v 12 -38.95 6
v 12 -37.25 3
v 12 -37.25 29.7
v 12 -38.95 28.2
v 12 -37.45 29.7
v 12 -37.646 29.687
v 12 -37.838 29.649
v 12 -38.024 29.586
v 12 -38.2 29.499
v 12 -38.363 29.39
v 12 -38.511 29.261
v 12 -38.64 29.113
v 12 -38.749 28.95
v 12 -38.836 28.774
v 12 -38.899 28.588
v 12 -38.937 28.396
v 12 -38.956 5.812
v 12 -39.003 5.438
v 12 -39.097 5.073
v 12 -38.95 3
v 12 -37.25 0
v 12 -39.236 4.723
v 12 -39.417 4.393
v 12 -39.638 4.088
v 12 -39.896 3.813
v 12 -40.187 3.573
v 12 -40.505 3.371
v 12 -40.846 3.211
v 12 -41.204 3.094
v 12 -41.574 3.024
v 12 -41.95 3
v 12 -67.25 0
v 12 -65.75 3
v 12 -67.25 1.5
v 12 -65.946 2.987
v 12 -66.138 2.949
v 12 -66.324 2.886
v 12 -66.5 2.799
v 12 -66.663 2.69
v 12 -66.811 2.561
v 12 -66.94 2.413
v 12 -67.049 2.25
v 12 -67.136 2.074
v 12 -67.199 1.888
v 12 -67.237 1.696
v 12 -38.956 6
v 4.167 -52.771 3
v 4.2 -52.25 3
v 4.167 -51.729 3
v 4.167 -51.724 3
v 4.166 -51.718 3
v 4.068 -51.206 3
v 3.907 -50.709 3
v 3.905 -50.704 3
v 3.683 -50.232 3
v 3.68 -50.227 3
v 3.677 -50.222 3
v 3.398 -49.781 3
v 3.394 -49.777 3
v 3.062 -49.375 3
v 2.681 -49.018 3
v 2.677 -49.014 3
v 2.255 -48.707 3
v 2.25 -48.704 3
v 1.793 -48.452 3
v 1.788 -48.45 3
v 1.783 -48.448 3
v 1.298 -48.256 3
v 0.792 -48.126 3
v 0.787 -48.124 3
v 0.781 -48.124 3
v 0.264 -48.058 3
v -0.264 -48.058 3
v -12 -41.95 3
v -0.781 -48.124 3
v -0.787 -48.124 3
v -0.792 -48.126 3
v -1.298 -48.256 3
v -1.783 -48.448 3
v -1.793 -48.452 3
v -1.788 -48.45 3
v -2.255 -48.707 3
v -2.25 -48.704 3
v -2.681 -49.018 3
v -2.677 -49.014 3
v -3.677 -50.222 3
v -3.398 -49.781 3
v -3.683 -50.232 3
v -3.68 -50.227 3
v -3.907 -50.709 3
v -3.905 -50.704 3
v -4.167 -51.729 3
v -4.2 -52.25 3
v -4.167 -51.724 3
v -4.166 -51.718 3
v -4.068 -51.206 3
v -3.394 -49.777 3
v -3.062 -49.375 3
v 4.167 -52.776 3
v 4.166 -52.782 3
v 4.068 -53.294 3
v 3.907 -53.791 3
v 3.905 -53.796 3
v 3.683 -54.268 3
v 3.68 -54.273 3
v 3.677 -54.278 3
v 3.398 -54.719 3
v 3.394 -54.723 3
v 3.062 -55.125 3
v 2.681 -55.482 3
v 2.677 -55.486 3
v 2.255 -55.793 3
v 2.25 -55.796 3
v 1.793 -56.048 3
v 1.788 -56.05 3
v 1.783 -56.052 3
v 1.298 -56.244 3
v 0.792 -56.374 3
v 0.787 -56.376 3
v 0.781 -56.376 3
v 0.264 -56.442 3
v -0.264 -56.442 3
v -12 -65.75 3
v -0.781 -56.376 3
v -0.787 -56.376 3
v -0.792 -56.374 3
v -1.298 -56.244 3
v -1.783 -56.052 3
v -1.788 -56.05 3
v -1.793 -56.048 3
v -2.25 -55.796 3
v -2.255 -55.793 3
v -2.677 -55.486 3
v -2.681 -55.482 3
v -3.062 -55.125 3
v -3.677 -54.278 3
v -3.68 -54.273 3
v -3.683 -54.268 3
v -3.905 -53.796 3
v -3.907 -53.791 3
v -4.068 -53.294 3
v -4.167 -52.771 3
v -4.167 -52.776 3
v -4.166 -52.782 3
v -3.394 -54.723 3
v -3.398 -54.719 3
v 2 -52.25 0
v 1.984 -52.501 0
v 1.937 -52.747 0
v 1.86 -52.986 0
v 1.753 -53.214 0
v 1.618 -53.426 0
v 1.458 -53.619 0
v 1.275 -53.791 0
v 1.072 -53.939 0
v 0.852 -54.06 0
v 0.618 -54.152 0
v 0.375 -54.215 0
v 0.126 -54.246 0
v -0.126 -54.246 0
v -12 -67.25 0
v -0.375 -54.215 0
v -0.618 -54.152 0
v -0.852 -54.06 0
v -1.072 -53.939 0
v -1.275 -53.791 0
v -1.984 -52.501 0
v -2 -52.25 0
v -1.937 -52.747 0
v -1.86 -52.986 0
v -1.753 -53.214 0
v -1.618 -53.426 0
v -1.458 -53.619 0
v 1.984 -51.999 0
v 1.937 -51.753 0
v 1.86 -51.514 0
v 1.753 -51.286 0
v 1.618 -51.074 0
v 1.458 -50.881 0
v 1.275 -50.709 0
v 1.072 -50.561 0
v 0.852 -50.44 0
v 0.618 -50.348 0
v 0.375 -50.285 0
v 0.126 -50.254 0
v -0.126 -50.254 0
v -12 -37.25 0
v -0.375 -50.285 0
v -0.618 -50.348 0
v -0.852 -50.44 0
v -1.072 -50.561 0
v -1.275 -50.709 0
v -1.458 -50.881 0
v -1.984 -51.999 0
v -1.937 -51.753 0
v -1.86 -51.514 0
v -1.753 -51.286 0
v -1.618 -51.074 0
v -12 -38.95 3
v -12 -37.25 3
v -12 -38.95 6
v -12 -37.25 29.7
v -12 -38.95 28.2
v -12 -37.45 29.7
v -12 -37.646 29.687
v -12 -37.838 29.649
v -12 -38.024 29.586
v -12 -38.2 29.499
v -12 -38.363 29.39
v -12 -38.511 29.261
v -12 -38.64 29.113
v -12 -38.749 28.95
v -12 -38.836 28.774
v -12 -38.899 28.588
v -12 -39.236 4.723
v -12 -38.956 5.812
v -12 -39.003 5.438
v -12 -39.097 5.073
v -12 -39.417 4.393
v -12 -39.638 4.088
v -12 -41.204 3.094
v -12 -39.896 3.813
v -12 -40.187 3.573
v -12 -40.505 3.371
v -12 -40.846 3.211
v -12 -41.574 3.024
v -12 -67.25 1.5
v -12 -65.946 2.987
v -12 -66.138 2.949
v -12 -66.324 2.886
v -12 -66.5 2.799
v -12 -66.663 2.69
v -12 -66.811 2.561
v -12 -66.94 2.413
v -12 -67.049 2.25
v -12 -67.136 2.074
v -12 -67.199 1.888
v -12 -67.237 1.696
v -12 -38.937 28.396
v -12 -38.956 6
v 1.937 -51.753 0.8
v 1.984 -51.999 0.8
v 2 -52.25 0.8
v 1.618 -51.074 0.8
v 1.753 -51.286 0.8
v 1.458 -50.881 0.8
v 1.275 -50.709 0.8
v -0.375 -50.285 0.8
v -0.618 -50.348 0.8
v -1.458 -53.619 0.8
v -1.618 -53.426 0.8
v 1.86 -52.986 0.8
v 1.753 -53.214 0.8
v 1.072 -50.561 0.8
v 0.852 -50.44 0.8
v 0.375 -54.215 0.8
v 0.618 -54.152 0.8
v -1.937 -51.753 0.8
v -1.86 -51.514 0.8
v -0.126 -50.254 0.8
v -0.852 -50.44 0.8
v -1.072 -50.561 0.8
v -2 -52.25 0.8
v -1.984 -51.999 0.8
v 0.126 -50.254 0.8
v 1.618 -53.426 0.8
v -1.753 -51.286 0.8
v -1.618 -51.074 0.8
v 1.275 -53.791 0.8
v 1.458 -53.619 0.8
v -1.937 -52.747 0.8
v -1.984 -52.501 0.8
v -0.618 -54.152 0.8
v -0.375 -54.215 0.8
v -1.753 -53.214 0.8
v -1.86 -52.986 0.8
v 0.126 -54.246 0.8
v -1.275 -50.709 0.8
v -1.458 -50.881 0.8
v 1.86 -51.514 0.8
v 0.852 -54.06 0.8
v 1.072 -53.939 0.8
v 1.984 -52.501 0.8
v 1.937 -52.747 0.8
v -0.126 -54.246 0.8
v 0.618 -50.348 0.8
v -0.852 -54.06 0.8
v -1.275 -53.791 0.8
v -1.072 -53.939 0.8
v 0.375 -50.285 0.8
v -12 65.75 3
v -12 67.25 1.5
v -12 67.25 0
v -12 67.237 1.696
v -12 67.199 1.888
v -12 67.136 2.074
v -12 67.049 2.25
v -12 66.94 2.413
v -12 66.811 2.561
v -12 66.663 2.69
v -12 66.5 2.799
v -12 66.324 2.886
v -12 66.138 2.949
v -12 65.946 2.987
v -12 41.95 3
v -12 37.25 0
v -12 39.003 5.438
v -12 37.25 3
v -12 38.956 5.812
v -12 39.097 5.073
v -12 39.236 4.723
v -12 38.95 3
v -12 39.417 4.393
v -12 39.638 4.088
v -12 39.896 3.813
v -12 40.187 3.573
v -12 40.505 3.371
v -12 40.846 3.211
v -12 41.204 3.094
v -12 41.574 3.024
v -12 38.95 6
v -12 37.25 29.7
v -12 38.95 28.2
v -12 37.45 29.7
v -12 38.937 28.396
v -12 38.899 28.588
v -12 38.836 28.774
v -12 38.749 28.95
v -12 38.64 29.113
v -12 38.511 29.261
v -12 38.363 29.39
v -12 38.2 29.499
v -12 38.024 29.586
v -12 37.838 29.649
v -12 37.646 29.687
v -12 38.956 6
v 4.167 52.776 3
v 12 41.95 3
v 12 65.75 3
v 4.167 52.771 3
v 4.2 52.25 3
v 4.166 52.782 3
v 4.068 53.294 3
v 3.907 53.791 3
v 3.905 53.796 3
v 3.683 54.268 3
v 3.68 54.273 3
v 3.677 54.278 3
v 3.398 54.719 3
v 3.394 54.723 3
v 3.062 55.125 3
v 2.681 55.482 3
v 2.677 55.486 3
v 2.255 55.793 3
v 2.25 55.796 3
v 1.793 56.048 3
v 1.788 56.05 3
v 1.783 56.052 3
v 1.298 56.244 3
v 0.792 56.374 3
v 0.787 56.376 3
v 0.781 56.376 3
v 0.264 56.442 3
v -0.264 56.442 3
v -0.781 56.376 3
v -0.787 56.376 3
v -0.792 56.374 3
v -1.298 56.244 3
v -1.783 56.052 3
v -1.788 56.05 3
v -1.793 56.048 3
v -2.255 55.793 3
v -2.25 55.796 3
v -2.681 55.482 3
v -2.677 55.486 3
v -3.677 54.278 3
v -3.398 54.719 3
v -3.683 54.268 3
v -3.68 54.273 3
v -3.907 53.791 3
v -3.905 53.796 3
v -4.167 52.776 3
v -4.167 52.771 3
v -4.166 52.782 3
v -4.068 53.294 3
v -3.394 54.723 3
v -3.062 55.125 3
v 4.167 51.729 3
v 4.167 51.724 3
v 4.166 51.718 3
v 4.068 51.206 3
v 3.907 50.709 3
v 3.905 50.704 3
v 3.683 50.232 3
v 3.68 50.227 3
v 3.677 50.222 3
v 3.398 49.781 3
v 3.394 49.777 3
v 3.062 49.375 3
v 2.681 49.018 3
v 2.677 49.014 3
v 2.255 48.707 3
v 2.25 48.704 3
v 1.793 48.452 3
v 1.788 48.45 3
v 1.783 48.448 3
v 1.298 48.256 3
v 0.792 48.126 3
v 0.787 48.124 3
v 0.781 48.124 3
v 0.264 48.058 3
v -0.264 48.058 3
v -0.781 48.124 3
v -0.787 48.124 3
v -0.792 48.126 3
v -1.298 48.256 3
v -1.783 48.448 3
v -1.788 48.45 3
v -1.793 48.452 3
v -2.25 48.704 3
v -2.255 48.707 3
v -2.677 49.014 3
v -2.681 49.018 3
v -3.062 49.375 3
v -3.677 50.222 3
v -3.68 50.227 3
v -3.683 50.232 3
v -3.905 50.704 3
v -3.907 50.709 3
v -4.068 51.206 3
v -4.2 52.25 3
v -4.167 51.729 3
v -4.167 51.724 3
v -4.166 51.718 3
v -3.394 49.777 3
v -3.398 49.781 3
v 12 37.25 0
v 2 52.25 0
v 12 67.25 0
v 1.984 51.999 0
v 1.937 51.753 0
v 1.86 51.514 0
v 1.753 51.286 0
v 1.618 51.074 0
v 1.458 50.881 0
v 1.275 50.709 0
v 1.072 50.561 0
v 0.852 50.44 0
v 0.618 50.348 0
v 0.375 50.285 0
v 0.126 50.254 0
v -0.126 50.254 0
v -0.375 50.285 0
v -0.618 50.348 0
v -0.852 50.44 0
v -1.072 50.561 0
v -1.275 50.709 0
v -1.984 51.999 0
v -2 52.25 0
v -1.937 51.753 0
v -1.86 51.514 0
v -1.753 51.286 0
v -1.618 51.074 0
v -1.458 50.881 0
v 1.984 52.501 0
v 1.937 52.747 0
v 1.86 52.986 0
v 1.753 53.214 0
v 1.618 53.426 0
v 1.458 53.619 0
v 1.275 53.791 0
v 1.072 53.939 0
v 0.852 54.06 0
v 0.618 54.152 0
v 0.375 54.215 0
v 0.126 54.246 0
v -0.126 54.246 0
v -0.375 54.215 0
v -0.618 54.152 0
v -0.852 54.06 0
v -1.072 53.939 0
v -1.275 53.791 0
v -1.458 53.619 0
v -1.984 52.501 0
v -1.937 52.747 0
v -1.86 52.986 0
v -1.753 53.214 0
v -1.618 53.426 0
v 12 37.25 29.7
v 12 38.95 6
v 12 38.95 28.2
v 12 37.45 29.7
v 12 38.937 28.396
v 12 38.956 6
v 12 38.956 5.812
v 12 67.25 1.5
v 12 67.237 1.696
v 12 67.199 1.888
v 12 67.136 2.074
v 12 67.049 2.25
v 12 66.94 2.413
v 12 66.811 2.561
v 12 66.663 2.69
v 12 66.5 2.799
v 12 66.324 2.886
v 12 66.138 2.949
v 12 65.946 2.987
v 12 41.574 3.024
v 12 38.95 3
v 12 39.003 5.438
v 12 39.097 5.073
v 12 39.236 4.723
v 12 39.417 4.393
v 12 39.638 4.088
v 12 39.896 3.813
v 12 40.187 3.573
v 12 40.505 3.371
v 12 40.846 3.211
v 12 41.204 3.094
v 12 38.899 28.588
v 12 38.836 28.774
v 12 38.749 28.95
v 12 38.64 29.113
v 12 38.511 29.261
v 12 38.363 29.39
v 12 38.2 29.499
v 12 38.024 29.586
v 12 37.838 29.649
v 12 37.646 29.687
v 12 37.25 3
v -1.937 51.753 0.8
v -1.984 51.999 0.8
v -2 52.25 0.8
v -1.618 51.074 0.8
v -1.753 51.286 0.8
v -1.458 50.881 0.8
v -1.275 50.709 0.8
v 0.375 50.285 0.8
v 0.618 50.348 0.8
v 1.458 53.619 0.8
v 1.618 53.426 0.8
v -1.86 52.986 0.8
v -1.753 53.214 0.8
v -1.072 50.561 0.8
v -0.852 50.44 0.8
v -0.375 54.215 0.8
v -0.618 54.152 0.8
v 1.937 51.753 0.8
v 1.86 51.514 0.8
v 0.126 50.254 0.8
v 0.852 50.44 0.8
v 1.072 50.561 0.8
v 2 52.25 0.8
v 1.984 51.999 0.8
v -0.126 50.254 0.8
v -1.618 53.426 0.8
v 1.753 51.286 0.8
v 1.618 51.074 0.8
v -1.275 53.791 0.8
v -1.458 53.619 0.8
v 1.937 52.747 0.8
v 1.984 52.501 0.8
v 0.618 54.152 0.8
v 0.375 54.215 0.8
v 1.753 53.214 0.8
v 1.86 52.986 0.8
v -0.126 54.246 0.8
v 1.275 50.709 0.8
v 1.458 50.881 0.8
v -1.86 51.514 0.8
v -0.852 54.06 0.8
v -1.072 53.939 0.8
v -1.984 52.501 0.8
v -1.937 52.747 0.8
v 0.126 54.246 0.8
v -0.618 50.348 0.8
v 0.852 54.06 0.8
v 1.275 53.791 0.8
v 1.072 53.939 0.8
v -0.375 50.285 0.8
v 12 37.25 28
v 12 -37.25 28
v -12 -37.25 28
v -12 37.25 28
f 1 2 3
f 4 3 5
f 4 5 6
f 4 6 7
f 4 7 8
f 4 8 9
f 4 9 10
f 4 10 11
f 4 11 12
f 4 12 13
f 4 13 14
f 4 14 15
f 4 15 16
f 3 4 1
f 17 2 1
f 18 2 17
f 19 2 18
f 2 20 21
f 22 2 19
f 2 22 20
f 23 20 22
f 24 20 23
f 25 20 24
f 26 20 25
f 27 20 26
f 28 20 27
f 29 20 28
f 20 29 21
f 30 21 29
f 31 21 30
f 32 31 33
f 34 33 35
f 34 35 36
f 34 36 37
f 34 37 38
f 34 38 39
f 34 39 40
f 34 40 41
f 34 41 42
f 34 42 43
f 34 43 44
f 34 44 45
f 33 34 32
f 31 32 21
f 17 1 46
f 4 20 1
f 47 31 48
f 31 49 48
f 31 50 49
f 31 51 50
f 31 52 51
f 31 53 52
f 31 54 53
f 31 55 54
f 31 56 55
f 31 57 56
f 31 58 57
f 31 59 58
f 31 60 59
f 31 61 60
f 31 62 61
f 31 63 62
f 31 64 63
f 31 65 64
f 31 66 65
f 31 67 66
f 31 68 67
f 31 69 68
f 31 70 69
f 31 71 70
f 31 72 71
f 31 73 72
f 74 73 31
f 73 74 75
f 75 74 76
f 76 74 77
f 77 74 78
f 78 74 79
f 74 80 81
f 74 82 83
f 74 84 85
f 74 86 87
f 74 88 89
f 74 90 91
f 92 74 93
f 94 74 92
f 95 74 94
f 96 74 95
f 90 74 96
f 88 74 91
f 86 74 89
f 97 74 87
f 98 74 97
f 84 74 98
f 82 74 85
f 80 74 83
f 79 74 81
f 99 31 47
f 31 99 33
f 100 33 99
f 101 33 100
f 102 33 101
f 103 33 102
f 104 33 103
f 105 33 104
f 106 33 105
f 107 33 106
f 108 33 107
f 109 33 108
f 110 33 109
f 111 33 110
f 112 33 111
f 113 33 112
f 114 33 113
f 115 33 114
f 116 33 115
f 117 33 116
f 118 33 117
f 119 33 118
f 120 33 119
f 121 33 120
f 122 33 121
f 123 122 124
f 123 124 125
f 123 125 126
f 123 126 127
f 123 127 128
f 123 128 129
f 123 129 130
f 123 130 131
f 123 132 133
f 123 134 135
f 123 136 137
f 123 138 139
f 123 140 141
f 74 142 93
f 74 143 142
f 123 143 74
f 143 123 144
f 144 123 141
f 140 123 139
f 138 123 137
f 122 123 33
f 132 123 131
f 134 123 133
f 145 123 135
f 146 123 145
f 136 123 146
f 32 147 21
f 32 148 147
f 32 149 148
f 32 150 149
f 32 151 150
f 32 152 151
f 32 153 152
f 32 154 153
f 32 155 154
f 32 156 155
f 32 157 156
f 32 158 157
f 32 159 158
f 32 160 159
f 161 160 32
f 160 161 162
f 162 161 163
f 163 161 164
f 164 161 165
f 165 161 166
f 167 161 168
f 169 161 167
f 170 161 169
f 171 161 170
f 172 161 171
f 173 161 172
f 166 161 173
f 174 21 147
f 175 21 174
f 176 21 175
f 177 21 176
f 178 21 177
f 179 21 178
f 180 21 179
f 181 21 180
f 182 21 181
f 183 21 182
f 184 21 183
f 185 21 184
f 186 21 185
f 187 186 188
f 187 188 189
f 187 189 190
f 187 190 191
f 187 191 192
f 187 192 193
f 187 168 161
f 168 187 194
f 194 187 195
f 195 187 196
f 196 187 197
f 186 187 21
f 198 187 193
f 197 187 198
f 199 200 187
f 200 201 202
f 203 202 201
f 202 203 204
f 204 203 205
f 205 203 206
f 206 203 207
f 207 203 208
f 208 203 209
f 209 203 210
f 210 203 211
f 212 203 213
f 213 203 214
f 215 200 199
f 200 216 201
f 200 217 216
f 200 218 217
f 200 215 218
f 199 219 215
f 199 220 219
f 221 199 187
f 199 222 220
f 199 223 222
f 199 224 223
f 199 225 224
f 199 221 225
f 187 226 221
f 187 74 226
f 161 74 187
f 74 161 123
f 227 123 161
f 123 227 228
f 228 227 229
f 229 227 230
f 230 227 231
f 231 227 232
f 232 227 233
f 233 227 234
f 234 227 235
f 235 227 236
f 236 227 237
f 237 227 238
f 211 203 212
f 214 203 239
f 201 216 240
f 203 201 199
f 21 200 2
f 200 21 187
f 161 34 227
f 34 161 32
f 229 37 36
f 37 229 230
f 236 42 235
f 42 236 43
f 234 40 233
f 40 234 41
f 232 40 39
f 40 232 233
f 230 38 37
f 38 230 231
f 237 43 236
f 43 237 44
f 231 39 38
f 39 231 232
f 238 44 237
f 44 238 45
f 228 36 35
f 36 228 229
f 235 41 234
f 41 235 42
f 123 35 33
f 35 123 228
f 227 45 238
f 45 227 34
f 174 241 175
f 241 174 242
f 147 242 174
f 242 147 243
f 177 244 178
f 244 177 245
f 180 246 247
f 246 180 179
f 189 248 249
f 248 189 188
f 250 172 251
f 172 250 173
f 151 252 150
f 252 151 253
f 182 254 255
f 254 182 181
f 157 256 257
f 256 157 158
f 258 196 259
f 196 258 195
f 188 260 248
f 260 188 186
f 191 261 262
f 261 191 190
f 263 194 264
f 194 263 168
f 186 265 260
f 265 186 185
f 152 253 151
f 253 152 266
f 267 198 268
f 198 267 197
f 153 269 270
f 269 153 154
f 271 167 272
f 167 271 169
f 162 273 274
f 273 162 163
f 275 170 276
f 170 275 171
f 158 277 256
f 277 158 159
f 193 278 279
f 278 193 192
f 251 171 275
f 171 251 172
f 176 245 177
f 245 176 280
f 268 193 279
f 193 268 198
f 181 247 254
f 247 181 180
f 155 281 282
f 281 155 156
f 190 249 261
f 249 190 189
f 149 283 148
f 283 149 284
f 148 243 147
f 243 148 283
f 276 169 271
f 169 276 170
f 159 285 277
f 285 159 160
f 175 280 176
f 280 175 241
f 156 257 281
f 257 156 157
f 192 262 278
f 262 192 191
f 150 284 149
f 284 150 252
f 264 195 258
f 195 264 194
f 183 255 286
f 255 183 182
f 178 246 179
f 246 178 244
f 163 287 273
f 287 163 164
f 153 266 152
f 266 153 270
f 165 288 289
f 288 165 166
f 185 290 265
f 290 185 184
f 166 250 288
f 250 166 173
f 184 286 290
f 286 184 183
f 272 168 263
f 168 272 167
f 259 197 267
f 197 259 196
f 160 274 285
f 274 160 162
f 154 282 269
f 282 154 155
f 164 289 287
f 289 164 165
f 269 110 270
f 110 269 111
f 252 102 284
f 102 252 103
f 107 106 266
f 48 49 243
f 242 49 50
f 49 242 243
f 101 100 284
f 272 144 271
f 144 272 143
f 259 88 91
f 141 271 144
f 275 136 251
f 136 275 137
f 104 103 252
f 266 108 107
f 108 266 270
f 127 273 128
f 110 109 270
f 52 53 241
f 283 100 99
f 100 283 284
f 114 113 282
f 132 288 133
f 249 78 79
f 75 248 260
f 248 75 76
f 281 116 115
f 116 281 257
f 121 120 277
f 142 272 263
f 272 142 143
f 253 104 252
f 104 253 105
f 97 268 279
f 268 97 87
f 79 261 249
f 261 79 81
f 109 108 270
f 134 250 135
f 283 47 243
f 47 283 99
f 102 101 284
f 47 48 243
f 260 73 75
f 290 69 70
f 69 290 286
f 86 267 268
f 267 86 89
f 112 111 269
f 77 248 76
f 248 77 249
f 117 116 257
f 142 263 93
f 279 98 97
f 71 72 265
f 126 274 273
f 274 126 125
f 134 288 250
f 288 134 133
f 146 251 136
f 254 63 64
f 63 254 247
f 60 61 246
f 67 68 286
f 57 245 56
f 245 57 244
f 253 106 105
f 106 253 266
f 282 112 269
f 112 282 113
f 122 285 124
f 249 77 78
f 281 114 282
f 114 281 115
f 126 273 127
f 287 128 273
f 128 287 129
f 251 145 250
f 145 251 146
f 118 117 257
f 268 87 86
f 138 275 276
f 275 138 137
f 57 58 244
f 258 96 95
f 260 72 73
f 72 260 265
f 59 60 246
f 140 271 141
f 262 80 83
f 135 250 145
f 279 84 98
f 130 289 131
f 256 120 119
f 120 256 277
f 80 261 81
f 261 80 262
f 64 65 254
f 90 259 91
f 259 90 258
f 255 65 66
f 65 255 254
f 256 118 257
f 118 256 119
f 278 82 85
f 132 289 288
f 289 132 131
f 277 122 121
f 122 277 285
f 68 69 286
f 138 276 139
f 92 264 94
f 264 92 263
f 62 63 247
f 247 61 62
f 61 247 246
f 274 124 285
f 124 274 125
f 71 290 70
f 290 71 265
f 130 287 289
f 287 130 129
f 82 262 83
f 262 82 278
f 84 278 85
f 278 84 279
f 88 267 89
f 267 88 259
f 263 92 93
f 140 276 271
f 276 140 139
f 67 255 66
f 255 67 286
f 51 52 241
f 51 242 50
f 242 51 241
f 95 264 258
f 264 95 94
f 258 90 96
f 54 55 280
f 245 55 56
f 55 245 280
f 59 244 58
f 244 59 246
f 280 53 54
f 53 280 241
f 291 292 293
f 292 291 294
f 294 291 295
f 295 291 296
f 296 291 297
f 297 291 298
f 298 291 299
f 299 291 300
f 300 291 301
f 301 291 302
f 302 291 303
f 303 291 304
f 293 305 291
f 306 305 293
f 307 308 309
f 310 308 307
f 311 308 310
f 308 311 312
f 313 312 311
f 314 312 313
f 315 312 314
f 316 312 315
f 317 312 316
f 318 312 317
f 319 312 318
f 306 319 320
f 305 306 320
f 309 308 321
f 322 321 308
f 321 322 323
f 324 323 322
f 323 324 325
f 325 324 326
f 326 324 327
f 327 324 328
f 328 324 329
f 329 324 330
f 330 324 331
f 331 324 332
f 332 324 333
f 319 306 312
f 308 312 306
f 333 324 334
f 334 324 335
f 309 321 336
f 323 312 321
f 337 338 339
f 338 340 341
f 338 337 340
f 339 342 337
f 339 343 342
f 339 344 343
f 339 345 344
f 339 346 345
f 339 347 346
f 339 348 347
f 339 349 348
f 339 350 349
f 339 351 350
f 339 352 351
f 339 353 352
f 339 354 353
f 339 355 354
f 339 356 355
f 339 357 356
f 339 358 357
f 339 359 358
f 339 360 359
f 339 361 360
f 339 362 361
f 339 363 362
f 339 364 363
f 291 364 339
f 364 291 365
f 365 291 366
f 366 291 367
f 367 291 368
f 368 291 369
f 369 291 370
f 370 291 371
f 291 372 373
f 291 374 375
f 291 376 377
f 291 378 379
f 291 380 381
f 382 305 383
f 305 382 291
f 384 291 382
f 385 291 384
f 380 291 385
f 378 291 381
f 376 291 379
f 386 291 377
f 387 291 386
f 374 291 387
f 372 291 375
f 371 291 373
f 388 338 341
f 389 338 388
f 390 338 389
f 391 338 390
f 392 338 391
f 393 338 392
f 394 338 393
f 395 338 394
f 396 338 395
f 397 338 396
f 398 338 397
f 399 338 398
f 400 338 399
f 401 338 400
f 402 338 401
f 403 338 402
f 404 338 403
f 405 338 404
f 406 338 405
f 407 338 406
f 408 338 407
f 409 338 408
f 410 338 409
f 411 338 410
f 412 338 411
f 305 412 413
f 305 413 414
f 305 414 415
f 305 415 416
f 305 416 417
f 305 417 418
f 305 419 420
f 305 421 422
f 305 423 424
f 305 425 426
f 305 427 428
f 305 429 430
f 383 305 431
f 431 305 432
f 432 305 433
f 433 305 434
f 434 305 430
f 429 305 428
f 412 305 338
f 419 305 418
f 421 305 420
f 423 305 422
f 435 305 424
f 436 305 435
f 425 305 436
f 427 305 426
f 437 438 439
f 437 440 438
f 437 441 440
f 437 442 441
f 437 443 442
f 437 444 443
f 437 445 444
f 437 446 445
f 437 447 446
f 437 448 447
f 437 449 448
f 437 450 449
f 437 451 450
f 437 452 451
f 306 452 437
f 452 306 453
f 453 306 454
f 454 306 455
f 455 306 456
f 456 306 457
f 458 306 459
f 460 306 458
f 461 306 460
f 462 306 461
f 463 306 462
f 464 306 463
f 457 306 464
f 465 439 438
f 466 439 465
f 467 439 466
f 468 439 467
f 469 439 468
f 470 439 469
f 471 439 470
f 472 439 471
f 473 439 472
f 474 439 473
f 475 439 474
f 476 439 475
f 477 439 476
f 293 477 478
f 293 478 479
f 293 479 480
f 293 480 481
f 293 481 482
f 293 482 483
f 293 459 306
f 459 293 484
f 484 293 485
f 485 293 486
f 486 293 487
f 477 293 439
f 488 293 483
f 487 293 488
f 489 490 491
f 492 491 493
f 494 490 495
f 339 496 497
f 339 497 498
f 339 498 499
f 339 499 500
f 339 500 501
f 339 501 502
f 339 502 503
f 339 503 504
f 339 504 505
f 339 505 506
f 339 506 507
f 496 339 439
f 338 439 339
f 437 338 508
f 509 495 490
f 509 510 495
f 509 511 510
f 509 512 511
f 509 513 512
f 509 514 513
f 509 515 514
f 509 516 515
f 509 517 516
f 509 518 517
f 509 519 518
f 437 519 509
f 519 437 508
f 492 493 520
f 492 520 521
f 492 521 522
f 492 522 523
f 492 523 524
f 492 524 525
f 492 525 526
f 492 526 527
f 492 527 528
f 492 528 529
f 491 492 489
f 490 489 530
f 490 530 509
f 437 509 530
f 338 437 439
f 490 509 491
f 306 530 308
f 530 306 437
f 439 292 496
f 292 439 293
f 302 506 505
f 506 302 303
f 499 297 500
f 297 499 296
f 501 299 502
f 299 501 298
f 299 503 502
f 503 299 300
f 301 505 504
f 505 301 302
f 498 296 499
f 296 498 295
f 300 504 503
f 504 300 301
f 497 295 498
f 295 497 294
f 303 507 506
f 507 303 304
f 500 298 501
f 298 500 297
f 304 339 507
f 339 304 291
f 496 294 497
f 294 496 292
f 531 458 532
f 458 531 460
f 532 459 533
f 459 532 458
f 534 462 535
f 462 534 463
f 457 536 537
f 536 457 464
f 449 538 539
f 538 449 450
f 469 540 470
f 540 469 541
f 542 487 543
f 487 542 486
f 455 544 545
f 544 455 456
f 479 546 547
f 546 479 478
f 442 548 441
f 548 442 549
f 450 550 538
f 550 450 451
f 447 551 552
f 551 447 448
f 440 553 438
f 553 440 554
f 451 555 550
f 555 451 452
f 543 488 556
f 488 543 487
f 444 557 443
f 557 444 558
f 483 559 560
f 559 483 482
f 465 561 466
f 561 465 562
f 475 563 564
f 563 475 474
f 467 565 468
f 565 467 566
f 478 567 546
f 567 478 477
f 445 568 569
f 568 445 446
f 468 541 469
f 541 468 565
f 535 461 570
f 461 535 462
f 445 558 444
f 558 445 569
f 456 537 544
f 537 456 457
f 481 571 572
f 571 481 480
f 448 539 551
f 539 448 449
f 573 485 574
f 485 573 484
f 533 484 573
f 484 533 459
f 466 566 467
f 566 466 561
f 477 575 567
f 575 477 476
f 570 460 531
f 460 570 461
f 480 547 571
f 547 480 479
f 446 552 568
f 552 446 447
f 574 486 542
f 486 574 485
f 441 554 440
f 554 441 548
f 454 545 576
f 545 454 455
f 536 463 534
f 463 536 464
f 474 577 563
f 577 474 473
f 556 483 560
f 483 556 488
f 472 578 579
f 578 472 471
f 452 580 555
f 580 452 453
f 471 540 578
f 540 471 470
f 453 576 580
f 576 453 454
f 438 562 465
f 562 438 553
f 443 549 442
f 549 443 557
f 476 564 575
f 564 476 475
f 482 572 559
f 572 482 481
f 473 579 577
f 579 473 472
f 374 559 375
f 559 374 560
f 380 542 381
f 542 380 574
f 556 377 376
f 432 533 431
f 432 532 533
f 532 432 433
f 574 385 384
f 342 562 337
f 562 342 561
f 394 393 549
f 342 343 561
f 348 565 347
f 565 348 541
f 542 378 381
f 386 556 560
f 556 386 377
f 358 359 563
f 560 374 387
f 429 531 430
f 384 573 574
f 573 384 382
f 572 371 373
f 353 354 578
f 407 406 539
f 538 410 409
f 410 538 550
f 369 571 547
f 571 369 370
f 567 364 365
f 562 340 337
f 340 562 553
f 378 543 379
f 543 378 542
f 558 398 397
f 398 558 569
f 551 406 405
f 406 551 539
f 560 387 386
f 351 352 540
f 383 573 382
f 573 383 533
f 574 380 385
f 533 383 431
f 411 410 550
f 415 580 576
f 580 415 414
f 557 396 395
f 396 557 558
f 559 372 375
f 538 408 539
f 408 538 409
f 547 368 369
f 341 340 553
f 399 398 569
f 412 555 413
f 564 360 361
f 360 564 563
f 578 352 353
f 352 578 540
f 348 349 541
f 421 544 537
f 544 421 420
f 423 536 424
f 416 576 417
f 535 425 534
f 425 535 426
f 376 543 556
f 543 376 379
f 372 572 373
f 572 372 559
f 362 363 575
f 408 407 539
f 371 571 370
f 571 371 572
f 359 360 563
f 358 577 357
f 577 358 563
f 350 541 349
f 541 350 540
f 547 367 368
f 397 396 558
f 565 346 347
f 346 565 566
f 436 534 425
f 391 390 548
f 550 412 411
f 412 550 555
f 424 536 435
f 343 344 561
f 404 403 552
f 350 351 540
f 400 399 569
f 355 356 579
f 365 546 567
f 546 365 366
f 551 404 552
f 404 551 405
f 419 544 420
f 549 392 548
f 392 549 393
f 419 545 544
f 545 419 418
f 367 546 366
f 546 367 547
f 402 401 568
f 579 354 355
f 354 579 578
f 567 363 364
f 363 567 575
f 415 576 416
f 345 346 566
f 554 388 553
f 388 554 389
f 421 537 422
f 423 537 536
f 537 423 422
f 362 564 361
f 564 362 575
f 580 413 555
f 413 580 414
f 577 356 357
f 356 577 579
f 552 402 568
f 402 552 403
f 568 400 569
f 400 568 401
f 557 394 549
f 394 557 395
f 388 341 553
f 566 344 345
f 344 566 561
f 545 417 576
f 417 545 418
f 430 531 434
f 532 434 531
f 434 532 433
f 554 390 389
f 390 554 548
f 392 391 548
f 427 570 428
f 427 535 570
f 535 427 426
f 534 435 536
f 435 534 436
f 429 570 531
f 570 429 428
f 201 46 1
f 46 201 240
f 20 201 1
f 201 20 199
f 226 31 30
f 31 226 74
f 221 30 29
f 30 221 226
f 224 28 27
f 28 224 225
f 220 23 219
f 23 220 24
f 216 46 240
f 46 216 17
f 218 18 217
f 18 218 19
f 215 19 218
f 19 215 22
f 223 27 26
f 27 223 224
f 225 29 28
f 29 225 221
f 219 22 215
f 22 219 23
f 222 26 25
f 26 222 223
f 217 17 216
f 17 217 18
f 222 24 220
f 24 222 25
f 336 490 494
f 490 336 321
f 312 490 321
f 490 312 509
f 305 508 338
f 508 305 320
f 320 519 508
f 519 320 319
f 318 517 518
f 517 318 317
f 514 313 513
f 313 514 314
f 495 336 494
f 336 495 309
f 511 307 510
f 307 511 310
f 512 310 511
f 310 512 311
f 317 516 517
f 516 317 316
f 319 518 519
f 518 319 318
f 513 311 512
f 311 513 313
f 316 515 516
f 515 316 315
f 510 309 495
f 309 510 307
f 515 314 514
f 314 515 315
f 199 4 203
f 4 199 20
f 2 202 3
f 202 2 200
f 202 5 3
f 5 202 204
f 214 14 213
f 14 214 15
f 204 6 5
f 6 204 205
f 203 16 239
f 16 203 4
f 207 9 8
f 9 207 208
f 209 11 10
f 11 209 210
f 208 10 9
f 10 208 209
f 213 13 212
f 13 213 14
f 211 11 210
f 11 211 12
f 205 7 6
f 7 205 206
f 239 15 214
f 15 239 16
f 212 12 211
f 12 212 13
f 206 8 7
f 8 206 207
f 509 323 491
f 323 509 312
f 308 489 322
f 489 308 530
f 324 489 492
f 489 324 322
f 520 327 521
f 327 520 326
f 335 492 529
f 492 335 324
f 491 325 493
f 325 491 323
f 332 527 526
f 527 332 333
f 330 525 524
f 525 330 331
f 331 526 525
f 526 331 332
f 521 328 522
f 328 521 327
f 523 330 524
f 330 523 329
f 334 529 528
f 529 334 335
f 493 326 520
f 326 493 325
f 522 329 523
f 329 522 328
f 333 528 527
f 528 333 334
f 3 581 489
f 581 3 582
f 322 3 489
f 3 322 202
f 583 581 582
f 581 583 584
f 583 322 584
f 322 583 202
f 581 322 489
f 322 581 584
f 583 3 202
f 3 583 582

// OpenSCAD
// file: ../../lib/rounded.scad
$fn=50;

module rounded_rectangle(width, height, radius) {
    minkowski() {
        square([width - radius*2, height - radius*2], center=true);
        circle(radius);
    }
}

module rounded_rectangle_border(width, height, radius, wall_width) {
    difference() {
      rounded_rectangle(width, height, radius);
      rounded_rectangle(width - wall_width*2, height - wall_width*2, radius);
    }
}

module rounded_cube(width, depth, height, radius) {
    minkowski() {
        cube([width - radius*2, depth - radius*2, height - radius*2], center=true);
        sphere(radius);
    }
}

module half_rounded_cube(width, depth, height, radius) {
    intersection() {
        rounded_cube(width, depth, height*2, radius);

        translate([-width/2, -depth/2, 0])
        cube([width, depth, height]);
    }
}

module quarter_rounded_cube(width, depth, height, radius) {
    intersection() {
        rounded_cube(width, depth*2, height*2, radius);

        translate([-width/2, 0, 0])
        cube([width, depth, height]);
    }
}

module negative_edge(width, radius) {
    difference() {
        cube([width, radius, radius], center = true);

        translate([0, radius/2, radius/2])
        rotate([0,90,0])
        cylinder(h = width + 0.1, r = radius, center = true);
    }
}


module rounded_edge(width, depth, height, radius) {
    assert(radius <= height, "Radius must be less or equal to the height");
    union() {
        translate([0, radius, 0])
        cube([width, depth - radius, height]);

        cube([width, radius, height - radius]);

        translate([0, radius, (height - radius)])
        quarter_cylinder(height = width, radius = radius);
    }
}

module centered_rounded_edge(width, depth, height, radius) {
    translate([-width/2, -depth/2, -height/2])
    rounded_edge(width, depth, height, radius);
}

module quarter_cylinder(height, radius) {
    rotate([90, -90, 90])
    rotate_extrude(angle = 90)
    square([radius, height]);
}

//cube([10,20,30]);
//rounded_cube(30, 50, 12, 5);
//half_rounded_cube(30, 50, 6, 5);
//quarter_rounded_cube(30, 25, 6, 5);
//centered_rounded_edge(100, 30, 12, 11);
//half_cylinder(30, 5);
//negative_edge(40, 5);
// file: ../../lib/chamfer.scad
module chamfered_hole(height, hole_diameter, chamfer_diameter) {
  chamfer_height = (chamfer_diameter - hole_diameter) / 2;
  cylinder_height = height - chamfer_height;

  translate([ 0, 0, -height / 2 ]) union() {
    // Add 0.1 to make sure the union with the chamfer is perfect
    cylinder(h = cylinder_height + 0.1, d = hole_diameter);

    translate([ 0, 0, cylinder_height ])
        cylinder(h = chamfer_height, d1 = hole_diameter, d2 = chamfer_diameter);
  }
}
// main file
$fn = 50;

use <../../lib/chamfer.scad>
use <../../lib/rounded.scad>

module grip(grip_depth, object_width, object_height, thingy_depth = 30,
            bottom_wall_width = 3, wall_width = 1.7) {
  large_fillet_radius = 3;

  union() {
    // Horizontal Left
    translate(
        [ 0, -thingy_depth / 2 - object_width / 2, bottom_wall_width / 2 ])
        grip_thingy(width = grip_depth, depth = thingy_depth,
                    height = bottom_wall_width);

    // Horizontal Right
    translate([ 0, thingy_depth / 2 + object_width / 2, bottom_wall_width / 2 ])
        rotate([ 0, 0, 180 ])
            grip_thingy(width = grip_depth, depth = thingy_depth,
                        height = bottom_wall_width);

    // Fillet Left
    translate([
      0, -large_fillet_radius / 2 - wall_width - object_width / 2,
      large_fillet_radius / 2 +
      bottom_wall_width
    ]) rotate([ 0, 0, 180 ])
        negative_edge(width = grip_depth, radius = large_fillet_radius);

    // Fillet Right
    translate([
      0, +large_fillet_radius / 2 + wall_width + object_width / 2,
      large_fillet_radius / 2 +
      bottom_wall_width
    ]) negative_edge(width = grip_depth, radius = large_fillet_radius);

    // Vertical Left
    translate([
      0, -wall_width / 2 - object_width / 2, object_height / 2 + wall_width / 2
    ]) rotate([ 90, 180, 0 ])
        centered_rounded_edge(width = grip_depth,
                              depth = object_height + wall_width,
                              height = wall_width, radius = 1.5);

    // Vertical right
    translate([
      0, wall_width / 2 + object_width / 2, object_height / 2 + wall_width / 2
    ]) rotate([ -90, 0, 0 ])
        centered_rounded_edge(width = grip_depth,
                              depth = object_height + wall_width,
                              height = wall_width, radius = 1.5);

    // Bar
    translate([ 0, 0, wall_width / 2 + object_height ])
        cube([ grip_depth, object_width, wall_width ], center = true);
  }
}

// The part that touches the table (where the screw goes)
module grip_thingy(width, depth, height, screw_hole_diameter = 4,
                   radius = 1.5) {
  cone_height = 2;
  difference() {
    centered_rounded_edge(width, depth, height, radius);
    chamfered_hole(height + 0.1, screw_hole_diameter,
                   screw_hole_diameter + 4.5);
  }
}

// grip_thingy(width = 15, depth = 30, height = 3);
// grip(grip_depth = 15, object_width = 100, object_height = 30);

// 4-port USB Charger
// grip(grip_depth = 34, object_width = 59, object_height = 28);

// Type-C Charger
grip(grip_depth = 24, object_width = 74.5, object_height = 28);
